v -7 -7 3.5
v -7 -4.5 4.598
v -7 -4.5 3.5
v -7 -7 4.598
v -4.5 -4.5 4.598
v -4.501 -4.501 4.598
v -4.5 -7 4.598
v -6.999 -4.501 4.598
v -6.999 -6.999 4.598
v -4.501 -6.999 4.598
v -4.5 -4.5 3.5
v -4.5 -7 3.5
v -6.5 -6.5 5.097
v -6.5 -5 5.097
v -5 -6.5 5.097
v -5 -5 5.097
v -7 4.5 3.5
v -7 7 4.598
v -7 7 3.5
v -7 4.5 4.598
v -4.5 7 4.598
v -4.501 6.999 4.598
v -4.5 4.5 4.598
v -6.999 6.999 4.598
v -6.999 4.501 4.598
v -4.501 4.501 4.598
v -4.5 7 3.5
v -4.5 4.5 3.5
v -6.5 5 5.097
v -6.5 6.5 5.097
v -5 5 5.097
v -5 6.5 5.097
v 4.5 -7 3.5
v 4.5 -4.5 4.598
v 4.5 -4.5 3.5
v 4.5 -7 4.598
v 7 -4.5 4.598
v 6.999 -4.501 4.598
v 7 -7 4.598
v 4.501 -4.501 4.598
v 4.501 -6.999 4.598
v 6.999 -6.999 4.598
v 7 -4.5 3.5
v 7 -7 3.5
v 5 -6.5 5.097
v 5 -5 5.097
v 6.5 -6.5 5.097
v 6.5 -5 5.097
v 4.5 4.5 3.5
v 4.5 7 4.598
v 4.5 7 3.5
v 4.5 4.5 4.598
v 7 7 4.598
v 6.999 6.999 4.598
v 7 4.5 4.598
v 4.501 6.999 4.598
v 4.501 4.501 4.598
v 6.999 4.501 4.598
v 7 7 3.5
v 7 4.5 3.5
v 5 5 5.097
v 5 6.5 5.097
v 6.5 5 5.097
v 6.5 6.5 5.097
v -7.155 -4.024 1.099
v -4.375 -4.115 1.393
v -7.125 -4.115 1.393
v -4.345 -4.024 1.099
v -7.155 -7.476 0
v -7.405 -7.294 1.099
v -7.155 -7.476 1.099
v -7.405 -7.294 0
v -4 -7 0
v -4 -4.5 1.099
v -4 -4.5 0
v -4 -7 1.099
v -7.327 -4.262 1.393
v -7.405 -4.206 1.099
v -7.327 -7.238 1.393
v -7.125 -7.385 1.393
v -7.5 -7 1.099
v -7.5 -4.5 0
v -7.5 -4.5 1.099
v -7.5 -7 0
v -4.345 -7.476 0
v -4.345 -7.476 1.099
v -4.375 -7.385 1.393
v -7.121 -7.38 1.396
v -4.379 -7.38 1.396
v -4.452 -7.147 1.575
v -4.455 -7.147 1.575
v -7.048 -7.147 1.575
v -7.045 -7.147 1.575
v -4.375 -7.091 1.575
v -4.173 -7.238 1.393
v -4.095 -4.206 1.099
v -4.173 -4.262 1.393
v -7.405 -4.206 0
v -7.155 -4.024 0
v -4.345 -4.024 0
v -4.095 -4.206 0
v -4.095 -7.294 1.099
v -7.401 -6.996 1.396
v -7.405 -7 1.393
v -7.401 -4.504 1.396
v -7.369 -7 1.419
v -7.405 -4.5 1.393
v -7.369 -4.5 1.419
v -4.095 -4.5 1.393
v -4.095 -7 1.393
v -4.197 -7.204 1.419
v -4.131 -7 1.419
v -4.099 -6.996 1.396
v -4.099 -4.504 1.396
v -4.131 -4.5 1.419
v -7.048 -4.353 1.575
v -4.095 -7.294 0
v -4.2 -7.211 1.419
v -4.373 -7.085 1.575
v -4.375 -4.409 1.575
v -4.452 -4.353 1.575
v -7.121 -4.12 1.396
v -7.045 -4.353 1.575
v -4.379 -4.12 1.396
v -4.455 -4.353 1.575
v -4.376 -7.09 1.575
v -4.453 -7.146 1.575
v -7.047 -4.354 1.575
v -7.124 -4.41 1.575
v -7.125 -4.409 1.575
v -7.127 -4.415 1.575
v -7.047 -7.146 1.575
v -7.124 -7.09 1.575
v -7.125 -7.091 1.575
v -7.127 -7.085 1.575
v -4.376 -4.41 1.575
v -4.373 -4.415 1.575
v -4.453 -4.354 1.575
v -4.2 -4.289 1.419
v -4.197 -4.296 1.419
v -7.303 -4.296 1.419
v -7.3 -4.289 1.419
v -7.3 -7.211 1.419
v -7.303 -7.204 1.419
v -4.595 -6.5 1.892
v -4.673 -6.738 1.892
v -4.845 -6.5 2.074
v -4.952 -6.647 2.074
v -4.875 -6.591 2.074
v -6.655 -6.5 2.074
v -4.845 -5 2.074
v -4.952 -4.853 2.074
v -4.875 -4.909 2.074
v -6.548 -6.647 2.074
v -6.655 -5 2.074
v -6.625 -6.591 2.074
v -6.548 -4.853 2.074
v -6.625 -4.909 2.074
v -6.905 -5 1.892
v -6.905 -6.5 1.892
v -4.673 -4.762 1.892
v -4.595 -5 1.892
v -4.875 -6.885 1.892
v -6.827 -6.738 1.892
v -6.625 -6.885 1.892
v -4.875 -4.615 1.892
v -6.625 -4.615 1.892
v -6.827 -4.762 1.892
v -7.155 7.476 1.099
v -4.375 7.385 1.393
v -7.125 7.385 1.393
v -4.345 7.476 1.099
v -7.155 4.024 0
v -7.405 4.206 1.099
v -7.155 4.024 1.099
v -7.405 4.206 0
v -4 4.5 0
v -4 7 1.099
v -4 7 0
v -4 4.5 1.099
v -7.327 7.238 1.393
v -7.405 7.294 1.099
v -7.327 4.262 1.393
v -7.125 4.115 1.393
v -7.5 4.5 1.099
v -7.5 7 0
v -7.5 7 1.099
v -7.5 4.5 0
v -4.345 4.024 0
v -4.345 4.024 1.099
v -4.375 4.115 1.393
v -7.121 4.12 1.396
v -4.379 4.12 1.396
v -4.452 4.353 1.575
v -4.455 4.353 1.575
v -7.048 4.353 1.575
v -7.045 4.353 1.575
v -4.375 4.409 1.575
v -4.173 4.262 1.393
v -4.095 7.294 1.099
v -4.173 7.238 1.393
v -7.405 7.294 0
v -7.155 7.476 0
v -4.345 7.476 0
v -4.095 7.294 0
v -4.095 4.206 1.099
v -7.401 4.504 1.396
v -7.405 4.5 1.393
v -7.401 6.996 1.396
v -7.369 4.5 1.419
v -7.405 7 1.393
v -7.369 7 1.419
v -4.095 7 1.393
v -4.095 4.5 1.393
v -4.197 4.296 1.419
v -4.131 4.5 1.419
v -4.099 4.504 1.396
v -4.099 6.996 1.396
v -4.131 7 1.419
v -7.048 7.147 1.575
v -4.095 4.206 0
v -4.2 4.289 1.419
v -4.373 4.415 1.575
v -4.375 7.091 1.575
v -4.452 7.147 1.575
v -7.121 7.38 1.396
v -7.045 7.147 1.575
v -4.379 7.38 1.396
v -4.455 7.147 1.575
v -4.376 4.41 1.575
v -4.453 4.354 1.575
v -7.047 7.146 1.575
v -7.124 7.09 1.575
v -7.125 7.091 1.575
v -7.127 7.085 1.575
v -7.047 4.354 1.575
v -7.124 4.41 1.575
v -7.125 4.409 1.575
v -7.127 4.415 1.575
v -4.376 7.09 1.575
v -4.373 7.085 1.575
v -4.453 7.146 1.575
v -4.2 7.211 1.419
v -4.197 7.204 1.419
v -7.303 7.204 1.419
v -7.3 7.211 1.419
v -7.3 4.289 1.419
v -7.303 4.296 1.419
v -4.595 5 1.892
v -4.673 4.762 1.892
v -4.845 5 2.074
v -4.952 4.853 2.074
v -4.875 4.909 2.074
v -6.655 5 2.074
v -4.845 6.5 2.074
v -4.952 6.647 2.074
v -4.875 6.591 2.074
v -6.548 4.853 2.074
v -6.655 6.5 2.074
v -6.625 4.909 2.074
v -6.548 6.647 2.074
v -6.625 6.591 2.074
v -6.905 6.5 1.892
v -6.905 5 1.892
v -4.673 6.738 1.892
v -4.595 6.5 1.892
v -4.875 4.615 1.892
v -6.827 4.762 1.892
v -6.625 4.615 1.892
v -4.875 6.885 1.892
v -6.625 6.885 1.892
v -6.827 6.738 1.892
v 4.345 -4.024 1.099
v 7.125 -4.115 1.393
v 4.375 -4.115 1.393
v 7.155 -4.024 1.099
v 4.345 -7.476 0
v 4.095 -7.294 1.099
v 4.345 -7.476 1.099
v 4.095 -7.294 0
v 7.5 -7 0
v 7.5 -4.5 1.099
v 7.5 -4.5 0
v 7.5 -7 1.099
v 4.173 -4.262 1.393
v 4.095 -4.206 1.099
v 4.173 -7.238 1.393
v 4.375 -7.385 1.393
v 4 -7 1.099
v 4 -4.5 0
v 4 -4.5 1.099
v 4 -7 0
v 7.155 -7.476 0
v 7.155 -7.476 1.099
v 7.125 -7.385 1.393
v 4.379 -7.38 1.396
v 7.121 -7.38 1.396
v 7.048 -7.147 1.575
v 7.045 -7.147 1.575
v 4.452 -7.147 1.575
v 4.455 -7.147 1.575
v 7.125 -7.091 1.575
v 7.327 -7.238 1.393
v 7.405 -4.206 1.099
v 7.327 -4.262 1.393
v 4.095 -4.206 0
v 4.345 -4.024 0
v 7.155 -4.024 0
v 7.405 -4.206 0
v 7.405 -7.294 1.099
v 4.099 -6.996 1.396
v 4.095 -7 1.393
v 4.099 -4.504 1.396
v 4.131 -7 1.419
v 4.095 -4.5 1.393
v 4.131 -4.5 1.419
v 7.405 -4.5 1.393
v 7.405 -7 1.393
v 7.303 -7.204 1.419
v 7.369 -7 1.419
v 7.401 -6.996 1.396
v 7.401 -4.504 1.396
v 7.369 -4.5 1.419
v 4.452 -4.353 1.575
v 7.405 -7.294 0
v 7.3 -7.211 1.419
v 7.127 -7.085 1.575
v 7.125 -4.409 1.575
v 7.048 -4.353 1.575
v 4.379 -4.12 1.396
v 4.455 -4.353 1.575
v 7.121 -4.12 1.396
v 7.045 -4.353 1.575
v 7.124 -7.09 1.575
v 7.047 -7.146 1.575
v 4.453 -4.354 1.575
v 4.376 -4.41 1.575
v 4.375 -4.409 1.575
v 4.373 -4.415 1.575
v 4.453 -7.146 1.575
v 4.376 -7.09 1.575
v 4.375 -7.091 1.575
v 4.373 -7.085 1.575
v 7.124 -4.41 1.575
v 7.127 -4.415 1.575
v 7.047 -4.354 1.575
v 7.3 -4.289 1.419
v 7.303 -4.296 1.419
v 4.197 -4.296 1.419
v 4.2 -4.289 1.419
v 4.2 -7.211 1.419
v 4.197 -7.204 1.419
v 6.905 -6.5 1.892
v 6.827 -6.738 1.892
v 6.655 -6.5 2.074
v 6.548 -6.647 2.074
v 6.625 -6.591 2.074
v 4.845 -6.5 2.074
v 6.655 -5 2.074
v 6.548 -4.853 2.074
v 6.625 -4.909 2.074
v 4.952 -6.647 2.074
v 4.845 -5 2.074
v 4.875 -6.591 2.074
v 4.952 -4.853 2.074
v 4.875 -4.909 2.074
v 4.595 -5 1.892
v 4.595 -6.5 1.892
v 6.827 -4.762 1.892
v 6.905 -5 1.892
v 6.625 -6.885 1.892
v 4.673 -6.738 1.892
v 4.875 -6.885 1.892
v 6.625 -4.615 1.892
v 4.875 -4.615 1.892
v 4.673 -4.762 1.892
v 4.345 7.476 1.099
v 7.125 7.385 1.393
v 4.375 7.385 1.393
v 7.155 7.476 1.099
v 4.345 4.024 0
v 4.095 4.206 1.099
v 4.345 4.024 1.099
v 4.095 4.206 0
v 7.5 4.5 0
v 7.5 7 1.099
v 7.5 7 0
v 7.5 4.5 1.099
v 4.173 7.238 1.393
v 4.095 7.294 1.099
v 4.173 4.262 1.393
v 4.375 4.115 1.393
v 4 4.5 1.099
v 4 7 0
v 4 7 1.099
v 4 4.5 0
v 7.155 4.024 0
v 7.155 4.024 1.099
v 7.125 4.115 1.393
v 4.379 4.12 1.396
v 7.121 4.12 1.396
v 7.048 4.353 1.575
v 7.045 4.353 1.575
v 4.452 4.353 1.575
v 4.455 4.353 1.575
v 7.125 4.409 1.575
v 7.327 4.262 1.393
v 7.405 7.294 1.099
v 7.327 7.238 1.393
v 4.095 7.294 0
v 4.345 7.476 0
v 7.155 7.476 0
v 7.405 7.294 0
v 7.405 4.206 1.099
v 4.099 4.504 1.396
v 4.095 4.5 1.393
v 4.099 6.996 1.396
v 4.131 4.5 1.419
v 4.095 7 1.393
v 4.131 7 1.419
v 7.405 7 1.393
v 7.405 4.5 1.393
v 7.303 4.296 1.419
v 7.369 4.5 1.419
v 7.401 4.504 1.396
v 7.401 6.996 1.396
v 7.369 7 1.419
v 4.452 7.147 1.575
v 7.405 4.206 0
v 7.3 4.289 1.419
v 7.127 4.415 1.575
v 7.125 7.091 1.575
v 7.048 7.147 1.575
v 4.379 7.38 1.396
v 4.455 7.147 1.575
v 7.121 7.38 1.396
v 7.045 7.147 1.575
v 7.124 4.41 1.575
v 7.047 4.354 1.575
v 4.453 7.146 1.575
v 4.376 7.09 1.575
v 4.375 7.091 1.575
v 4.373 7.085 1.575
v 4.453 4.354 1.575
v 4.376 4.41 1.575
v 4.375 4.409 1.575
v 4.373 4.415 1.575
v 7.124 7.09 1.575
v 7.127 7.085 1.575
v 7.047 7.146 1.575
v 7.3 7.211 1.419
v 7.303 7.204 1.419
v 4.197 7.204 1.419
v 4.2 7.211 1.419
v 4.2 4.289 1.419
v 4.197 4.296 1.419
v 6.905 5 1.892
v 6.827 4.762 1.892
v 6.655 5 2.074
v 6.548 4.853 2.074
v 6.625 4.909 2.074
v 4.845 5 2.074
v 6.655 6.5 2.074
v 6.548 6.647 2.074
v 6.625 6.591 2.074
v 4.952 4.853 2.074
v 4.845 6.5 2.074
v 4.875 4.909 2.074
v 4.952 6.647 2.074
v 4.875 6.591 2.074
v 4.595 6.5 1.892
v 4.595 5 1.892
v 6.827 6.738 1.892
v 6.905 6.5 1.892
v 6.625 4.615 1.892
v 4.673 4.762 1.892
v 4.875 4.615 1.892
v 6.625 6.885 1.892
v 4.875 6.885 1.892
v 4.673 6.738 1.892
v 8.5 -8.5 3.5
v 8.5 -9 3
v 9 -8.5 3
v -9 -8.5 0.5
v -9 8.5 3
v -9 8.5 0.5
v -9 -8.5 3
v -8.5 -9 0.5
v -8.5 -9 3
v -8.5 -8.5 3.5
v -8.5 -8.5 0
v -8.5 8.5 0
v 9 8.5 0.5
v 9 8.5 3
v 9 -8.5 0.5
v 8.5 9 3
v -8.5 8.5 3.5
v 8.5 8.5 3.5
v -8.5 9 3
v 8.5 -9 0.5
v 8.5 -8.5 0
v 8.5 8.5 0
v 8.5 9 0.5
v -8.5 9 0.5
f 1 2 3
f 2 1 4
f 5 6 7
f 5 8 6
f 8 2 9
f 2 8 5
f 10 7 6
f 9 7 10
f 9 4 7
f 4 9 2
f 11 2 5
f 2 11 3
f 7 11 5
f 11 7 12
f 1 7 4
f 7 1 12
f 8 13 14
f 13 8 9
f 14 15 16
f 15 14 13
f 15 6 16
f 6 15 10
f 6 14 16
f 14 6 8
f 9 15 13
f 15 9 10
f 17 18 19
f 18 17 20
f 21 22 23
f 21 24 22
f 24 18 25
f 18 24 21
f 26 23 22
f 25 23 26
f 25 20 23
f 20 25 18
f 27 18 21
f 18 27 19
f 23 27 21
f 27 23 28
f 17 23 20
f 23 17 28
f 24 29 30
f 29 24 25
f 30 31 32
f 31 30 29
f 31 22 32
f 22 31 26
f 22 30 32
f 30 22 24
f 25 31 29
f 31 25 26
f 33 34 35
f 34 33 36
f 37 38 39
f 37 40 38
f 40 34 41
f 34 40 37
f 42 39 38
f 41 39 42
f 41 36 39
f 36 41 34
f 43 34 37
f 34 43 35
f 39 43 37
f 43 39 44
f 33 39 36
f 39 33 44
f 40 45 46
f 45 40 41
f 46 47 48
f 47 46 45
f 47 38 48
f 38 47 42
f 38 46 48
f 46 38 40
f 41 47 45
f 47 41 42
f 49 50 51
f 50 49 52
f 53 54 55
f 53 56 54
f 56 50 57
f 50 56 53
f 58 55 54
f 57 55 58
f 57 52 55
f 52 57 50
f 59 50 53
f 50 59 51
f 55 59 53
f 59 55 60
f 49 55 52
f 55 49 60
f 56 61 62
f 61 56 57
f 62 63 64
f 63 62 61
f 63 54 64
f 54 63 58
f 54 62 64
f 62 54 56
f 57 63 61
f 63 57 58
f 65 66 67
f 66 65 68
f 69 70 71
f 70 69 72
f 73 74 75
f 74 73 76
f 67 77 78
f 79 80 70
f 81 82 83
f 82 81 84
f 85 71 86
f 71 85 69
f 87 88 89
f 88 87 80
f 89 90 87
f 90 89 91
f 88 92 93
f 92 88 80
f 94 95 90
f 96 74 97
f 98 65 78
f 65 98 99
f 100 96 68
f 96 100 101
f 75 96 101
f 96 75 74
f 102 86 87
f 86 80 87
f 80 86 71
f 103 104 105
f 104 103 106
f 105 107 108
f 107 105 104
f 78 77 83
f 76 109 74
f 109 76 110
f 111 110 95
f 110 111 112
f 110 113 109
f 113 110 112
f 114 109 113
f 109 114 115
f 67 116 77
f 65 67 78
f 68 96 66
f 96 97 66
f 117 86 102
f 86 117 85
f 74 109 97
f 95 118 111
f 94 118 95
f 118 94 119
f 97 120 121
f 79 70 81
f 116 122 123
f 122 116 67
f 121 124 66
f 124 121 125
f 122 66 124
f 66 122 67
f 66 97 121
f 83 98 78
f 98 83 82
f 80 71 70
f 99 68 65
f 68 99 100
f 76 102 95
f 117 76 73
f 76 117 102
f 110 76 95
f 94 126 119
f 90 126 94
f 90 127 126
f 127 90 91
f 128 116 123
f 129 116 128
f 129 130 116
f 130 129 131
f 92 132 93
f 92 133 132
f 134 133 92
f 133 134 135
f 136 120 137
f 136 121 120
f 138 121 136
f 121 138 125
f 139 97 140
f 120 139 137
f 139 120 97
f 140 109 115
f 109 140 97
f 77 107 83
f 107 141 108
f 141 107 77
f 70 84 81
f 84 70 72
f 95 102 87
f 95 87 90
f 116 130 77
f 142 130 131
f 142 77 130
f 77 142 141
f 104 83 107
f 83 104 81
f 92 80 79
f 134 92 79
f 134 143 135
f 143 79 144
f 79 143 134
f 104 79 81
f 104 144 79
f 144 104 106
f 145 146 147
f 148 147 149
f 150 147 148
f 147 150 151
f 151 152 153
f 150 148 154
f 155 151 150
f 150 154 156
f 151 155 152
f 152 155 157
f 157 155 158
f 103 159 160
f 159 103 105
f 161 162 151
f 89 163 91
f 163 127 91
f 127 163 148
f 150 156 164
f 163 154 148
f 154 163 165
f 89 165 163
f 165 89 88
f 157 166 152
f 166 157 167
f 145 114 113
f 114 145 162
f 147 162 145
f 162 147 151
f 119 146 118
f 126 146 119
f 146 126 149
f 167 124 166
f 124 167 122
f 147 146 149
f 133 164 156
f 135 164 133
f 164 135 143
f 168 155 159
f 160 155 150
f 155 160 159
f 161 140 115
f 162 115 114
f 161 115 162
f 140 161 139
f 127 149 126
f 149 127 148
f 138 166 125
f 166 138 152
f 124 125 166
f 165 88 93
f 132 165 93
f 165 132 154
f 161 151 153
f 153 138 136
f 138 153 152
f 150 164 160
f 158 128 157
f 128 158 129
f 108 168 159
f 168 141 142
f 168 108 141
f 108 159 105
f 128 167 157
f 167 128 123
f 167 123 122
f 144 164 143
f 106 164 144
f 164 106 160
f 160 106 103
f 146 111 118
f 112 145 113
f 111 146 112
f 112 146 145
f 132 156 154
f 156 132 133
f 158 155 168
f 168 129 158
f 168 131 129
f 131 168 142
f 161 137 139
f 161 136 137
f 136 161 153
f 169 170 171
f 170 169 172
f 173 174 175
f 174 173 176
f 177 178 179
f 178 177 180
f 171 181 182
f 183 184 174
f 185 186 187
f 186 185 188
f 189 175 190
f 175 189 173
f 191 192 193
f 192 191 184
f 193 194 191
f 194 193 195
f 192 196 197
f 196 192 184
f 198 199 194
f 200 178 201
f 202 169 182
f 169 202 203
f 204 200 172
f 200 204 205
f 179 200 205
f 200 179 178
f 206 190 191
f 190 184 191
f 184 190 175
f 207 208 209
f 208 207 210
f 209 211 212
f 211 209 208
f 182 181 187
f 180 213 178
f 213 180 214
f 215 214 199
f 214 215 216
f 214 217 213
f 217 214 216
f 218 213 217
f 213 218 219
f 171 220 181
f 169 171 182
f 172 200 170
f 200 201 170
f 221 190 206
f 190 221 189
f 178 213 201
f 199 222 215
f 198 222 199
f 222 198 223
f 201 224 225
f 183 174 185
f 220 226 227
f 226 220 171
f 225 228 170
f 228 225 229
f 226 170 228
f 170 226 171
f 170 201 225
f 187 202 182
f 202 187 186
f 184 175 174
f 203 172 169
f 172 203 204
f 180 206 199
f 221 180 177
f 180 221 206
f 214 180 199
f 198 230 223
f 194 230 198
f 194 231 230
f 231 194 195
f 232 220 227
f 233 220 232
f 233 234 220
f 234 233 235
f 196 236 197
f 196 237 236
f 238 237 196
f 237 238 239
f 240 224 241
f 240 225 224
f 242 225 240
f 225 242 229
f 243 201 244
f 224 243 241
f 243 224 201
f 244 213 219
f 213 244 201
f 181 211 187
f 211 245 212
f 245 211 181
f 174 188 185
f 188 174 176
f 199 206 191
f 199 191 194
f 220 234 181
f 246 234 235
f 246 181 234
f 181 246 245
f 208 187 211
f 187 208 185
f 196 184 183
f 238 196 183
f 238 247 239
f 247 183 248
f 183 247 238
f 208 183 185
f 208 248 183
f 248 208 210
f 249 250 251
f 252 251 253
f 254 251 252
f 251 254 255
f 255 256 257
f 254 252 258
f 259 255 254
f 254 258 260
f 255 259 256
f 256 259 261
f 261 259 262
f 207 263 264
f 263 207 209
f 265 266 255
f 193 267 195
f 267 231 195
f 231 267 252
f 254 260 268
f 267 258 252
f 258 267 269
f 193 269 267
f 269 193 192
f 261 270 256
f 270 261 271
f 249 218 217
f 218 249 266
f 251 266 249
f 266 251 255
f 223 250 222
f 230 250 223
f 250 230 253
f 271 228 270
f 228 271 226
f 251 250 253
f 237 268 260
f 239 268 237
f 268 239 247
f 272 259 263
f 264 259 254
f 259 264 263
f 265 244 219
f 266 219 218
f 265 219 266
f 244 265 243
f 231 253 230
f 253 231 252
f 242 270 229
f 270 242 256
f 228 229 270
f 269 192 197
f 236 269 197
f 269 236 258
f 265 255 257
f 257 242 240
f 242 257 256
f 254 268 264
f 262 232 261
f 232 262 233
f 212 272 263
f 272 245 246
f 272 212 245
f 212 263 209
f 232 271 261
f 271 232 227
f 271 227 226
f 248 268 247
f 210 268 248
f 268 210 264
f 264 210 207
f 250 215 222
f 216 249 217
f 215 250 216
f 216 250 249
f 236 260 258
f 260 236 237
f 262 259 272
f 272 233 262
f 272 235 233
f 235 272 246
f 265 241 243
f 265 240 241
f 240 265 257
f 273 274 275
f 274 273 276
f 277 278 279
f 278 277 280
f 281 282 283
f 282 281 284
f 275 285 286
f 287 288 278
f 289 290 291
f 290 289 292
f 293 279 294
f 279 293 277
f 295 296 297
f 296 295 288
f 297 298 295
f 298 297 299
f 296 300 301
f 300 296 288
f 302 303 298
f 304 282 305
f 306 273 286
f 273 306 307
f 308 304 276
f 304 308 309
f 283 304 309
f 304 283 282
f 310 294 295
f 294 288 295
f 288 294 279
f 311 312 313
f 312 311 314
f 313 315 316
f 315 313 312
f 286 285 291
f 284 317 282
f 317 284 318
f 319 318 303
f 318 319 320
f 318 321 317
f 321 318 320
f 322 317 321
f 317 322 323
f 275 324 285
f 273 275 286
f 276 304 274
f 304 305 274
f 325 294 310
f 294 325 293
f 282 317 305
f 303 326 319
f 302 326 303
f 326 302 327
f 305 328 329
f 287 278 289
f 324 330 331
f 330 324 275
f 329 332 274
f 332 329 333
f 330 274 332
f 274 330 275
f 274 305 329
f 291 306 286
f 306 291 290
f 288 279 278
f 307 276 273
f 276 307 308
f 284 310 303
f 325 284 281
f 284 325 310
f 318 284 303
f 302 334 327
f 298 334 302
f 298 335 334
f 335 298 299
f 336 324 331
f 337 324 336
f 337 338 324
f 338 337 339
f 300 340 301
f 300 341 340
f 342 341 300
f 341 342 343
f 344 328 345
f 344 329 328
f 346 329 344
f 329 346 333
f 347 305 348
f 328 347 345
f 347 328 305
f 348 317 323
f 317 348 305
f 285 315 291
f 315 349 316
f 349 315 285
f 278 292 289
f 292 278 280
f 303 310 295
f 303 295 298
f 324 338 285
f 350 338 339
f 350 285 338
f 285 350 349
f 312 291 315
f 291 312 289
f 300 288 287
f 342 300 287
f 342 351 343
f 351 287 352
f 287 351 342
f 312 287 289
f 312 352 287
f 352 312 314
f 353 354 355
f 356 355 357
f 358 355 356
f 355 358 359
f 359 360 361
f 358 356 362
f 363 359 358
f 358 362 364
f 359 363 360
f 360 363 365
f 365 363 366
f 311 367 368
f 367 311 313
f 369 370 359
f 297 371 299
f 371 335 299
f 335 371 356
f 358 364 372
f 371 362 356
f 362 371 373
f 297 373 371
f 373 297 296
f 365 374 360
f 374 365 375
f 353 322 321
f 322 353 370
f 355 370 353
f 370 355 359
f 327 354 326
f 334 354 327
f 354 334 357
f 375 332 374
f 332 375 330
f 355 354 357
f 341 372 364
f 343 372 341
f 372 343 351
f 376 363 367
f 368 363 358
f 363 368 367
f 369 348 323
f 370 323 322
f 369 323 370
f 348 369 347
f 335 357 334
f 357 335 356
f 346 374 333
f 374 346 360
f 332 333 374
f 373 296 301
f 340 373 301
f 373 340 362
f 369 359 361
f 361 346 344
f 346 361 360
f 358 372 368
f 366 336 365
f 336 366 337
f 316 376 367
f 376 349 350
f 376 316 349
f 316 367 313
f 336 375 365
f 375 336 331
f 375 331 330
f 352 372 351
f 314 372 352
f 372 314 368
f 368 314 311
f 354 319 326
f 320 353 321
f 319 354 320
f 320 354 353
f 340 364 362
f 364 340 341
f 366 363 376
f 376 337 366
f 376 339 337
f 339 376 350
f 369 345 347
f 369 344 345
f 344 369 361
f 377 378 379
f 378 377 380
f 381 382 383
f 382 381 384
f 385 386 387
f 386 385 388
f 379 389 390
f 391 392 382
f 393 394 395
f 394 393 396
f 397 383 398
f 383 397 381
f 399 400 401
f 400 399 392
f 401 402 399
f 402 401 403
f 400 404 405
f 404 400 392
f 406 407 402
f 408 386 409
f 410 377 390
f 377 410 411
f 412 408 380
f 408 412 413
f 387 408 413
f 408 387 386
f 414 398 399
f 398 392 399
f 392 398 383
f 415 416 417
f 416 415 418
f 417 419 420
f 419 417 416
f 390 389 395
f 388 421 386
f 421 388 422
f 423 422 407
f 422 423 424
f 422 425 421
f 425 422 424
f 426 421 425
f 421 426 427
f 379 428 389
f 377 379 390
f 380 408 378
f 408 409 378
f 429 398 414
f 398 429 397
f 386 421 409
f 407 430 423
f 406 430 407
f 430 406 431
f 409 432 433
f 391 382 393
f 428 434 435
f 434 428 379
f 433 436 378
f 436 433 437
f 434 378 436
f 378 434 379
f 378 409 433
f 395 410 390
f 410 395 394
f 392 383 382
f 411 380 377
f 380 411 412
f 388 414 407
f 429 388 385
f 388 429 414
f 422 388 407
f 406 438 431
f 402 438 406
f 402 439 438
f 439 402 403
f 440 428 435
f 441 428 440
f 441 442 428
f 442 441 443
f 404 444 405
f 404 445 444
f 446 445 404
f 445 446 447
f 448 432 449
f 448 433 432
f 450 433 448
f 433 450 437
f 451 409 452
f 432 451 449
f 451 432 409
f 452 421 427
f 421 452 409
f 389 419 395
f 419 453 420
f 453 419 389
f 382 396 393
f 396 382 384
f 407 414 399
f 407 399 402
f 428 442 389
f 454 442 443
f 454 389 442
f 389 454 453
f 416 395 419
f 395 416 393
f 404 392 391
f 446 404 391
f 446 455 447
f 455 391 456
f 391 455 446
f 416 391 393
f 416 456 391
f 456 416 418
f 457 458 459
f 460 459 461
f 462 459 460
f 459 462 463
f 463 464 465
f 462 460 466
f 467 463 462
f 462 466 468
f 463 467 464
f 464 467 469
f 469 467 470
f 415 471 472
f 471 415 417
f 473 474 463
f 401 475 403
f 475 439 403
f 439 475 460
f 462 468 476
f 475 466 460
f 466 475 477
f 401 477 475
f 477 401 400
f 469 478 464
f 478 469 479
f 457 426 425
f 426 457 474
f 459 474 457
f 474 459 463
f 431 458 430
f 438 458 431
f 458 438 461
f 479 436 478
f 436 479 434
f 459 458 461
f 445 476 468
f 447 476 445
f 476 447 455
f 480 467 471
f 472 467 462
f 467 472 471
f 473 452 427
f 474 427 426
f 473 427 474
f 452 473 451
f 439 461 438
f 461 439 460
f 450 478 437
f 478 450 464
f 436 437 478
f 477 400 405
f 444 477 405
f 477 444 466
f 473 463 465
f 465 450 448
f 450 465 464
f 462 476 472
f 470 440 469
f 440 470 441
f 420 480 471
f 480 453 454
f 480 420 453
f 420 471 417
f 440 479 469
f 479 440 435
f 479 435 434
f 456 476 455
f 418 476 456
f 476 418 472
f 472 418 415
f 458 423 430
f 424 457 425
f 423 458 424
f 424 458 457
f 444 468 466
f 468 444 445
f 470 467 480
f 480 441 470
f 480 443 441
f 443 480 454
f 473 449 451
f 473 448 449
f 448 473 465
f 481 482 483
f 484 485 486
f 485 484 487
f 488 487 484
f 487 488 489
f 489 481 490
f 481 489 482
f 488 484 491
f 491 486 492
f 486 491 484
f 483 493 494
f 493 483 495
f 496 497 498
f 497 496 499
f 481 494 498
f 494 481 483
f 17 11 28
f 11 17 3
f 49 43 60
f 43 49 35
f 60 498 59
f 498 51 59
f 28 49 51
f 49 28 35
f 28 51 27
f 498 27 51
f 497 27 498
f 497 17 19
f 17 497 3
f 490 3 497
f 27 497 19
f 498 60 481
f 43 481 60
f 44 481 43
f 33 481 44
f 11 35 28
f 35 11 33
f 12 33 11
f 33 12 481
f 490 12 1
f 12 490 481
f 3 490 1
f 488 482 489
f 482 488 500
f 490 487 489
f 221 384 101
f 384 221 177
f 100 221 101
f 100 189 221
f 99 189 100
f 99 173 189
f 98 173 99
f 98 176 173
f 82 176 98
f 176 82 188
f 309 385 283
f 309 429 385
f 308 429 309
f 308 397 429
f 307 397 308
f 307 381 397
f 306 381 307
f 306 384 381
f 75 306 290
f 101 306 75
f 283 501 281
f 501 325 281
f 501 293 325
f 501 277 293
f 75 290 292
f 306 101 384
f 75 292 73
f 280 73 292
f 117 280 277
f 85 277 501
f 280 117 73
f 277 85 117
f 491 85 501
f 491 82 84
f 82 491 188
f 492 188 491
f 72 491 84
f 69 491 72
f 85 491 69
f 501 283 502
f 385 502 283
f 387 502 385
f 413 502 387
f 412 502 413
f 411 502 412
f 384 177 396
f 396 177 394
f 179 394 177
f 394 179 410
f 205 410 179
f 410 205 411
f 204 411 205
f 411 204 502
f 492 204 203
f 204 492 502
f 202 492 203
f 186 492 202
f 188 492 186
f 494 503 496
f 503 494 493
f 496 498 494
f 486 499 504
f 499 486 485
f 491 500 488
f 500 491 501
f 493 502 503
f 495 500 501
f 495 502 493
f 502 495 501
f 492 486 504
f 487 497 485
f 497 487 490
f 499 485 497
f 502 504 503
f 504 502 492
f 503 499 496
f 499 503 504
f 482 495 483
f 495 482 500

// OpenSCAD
// file: common.scad
// Unless otherwise specified, each resulting shape is
// resting on the XY plane, centered on the Z axis.

// A small amount to make sure shapes overlap when needed. This
// is well below the resolution of my 3D printer, so it
// shouldn't affect the final result.
eps = 0.001;

// High quality for printing.
$fa = 5;
$fs = 0.4;

module repeatx(n, spacing) {
  for (i = [1:n])
    translate([(i-1)*spacing, 0, 0])
      children();
}

// Standard chamfer on all edges and corners. This makes the
// pieces more comfortable to handle.
chamfer = 0.5;

// A regular octahedron centered on the origin with its vertices
// on the axes. 'axis' gives its full length along each axis.
module octahedron(axis) {
  // Top and bottom halves.
  for (a = [-1, 1])
    scale([1, 1, a])
      // Extrude a square into a pyramid.
      linear_extrude(axis/2, scale=0)
        rotate([0, 0, 45])
          square(norm([axis/2, axis/2]), center=true);
}

// 'd' is the outer dimensions of the box.
module chamfered_box(d) {
  assert(d.x >= 1);
  assert(d.y >= 1);
  assert(d.z >= 1);

  // Raise the result up so it is resting on the XY plane.
  translate([0, 0, d.z/2]) {
    minkowski() {
      // The desired cube, scaled back by the chamfer distance
      // in all directions.
      cube(d - [chamfer*2, chamfer*2, chamfer*2], center=true);
      octahedron(chamfer*2);
    }
  }
}

module chamfered_disk(height, radius) {
  assert(radius >= 0.5);
  assert(height >= 1);

  // Raise the result up so it is resting on the XY plane.
  translate([0, 0, height/2]) {
    minkowski() {
      // The desired disk, scaled back by the chamfer distance
      // in all directions.
      cylinder(height-chamfer*2, r=radius-chamfer, center=true);
      octahedron(chamfer*2);
    }
  }
}

locking_lug_dims = [2.3, 2.3, 1.8+2*eps];

// A snug fit for gluing.
module locking_lug() {
  // Taper the lug slightly, to counteract the printing effect
  // which spreads the top layer slightly.
  linear_extrude(locking_lug_dims.z, scale=0.95)
    square([locking_lug_dims.x, locking_lug_dims.y],
            center=true);
}

// Make extra sure the lug will fit all the way into the hole.
locking_socket_extra_depth = 0.7;

module locking_socket_top() {
  translate([
    0, 0,
    -(locking_lug_dims.z+locking_socket_extra_depth)/2+eps
  ]) {
    cube(locking_lug_dims + [
      0.15, 0.15,
      locking_socket_extra_depth
    ], center=true);
  }
}

module locking_socket_bottom() {
  translate([
    0, 0,
    (locking_lug_dims.z+locking_socket_extra_depth)/2-eps
  ]) {
    cube(locking_lug_dims + [
      // When printing this on the bottom of a model, it
      // needs to be a bit wider to account for
      // elephant-foot.
      0.3, 0.3,
      locking_socket_extra_depth
    ], center=true);
  }
}

// A pin which can be used to join two locking sockets.
module locking_pin() {
  dims = [
    locking_lug_dims.x,
    // Lay the pin on its side for more reliable printing.
    locking_lug_dims.z*2 + locking_socket_extra_depth/2,
    locking_lug_dims.y,
  ];
  translate([0, 0, dims.z/2])
    cube(dims, center=true);
}
// main file
include <common.scad>

// Studs are 1.6mm high and 2.5mm across.
stud_width = 2.5;

// Studs are spaced 2mm in from the edges of an 18x18mm square.
stud_inset = 2;

module stud() {
  translate([0, 0, -eps])
    linear_extrude(1.1)
      square(stud_width, center=true);
  translate([0, 0, 1.1-2*eps])
    linear_extrude(0.5, scale = 0.6)
      square(stud_width, center=true);
}

module make_studs() {
  displacement = (18/2)-(stud_width/2)-stud_inset;  
  for (a = [-1, 1], b = [-1, 1])
    translate([a*displacement, b*displacement, 0])
      children();
}

// A stackable box, 18x18mm, with optional studs and holes.
module stackable_box(height, studs=true, holes=true) {
  if (studs)
    translate([0, 0, height - eps])
      make_studs() stud();

  difference() {
    chamfered_box([18, 18, height]);
    
    if (holes) {
      make_studs() {
        minkowski() {
          stud();
          sphere(r=0.5, $fn=10);
        }
      }
    }
  }
}

// A stackable chip, for going on top of a head.
module head_chip() {
  stackable_box(3.5);
}

// A head, which is intended to have 2 chips stacked on top.
module head(face_raster) {
  // Lift the head slightly to fit the lug underneath.
  translate([0, 0, locking_lug_dims.z]) {
    difference() {
      // A 10mm head plus two 3.5mm chips comes to 17mm,
      // which is slightly less than the 18mm width. That's
      // by design. It looks better not to have such tall 
      // heads, perhaps because the studs on top give the
      // illusion of added height.
      stackable_box(10, holes=false);
      
      // Bring the mask out a bit extra (0.05mm) to avoid
      // having it intersect the studs at all.
      translate([0, -9.05, 0])
        face(face_raster);
    }
    
    // A lug for gluing to a body.
    scale([1, 1, -1])
      locking_lug();
  }
}

// 'raster' is an array of 5 rows, where each row has 8
// elements. Each element should be in [0, 1]. A '1' means the
// given position will be fully engraved on the face.
// Returns a mask which should be subtracted from the head.
// The Z axis will coincide with the centerline of the 
// mask's front.
module face(raster) {
  // Below we use a unit of 1 to represent one pixel on
  // the face. Scale up to an 18mm face, 8 pixels wide.
  scale([2.25, 2.25, 2.25]) {
    translate([-4, -eps, -eps]) {
      difference() {
        // Begin with a filled-in face plate.
        translate([-eps, -eps, -eps])
          cube([8+2*eps, 0.9+2*eps, 5+2*eps]);
        
        // Subtract the material which needs to remain on the
        // head. Leave some support under each shelf.
        for (r = [0:4])
          for (c = [0:7])
            translate([c-eps, raster[r][c]-eps, 4-r-eps])
              rotate([90, 0, 90])
                translate([0, 0, -2*eps])
                  linear_extrude(1+4*eps)
                    polygon([
                      [   -2*eps,     -2*eps],
                      [0.9+2*eps, -0.5-2*eps],
                      [0.9+2*eps,    1+2*eps],
                      [   -2*eps,    1+2*eps],
                    ]);
      }
    }
  }
}

module creeper_head() {
  head([
    [0, 1, 1, 0, 0, 1, 1, 0],
    [0, 1, 1, 0, 0, 1, 1, 0],
    [0, 0, 0, 1, 1, 0, 0, 0],
    [0, 0, 1, 1, 1, 1, 0, 0],
    [0, 0, 1, 0, 0, 1, 0, 0],
  ]);
}

module zombie_head() {
  head([
    [0.0, 0.0, 0.0, 0.0, 0.0, 0.0, 0.0, 0.0],
    [0.0, 1.0, 1.0, 0.0, 0.0, 1.0, 1.0, 0.0],
    [0.0, 0.0, 0.0, 0.8, 0.8, 0.0, 0.0, 0.0],
    [0.0, 0.0, 0.2, 0.2, 0.2, 0.2, 0.0, 0.0],
    [0.0, 0.0, 0.2, 0.2, 0.2, 0.2, 0.0, 0.0],
  ]);
}

module skeleton_head() {
  head([
    [0, 0, 0, 0, 0, 0, 0, 0],
    [0, 1, 1, 0, 0, 1, 1, 0],
    [0, 0, 0, 1, 1, 0, 0, 0],
    [0, 1, 1, 1, 1, 1, 1, 0],
    [0, 0, 0, 0, 0, 0, 0, 0],
  ]);
}

module spider_head() {
  head([
    [1, 0, 0, 0, 0, 0, 0, 1],
    [1, 0, 1, 1, 1, 1, 0, 1],
    [0, 0, 1, 1, 1, 1, 0, 0],
    [0, 0, 0, 0, 0, 0, 0, 0],
    [0, 0, 1, 0, 0, 1, 0, 0],
  ]);
}

module steve_head() {
  head([
    [0, 0, 0, 0, 0, 0, 0, 0],
    [0, 0.7, 1, 0, 0, 1, 0.7, 0],
    [0, 0, 0, 0.8, 0.8, 0, 0, 0],
    [0, 0, 1, 0, 0, 1, 0, 0],
    [0, 0, 1, 1, 1, 1, 0, 0],
  ]);
}

// Demo.
head_chip();
